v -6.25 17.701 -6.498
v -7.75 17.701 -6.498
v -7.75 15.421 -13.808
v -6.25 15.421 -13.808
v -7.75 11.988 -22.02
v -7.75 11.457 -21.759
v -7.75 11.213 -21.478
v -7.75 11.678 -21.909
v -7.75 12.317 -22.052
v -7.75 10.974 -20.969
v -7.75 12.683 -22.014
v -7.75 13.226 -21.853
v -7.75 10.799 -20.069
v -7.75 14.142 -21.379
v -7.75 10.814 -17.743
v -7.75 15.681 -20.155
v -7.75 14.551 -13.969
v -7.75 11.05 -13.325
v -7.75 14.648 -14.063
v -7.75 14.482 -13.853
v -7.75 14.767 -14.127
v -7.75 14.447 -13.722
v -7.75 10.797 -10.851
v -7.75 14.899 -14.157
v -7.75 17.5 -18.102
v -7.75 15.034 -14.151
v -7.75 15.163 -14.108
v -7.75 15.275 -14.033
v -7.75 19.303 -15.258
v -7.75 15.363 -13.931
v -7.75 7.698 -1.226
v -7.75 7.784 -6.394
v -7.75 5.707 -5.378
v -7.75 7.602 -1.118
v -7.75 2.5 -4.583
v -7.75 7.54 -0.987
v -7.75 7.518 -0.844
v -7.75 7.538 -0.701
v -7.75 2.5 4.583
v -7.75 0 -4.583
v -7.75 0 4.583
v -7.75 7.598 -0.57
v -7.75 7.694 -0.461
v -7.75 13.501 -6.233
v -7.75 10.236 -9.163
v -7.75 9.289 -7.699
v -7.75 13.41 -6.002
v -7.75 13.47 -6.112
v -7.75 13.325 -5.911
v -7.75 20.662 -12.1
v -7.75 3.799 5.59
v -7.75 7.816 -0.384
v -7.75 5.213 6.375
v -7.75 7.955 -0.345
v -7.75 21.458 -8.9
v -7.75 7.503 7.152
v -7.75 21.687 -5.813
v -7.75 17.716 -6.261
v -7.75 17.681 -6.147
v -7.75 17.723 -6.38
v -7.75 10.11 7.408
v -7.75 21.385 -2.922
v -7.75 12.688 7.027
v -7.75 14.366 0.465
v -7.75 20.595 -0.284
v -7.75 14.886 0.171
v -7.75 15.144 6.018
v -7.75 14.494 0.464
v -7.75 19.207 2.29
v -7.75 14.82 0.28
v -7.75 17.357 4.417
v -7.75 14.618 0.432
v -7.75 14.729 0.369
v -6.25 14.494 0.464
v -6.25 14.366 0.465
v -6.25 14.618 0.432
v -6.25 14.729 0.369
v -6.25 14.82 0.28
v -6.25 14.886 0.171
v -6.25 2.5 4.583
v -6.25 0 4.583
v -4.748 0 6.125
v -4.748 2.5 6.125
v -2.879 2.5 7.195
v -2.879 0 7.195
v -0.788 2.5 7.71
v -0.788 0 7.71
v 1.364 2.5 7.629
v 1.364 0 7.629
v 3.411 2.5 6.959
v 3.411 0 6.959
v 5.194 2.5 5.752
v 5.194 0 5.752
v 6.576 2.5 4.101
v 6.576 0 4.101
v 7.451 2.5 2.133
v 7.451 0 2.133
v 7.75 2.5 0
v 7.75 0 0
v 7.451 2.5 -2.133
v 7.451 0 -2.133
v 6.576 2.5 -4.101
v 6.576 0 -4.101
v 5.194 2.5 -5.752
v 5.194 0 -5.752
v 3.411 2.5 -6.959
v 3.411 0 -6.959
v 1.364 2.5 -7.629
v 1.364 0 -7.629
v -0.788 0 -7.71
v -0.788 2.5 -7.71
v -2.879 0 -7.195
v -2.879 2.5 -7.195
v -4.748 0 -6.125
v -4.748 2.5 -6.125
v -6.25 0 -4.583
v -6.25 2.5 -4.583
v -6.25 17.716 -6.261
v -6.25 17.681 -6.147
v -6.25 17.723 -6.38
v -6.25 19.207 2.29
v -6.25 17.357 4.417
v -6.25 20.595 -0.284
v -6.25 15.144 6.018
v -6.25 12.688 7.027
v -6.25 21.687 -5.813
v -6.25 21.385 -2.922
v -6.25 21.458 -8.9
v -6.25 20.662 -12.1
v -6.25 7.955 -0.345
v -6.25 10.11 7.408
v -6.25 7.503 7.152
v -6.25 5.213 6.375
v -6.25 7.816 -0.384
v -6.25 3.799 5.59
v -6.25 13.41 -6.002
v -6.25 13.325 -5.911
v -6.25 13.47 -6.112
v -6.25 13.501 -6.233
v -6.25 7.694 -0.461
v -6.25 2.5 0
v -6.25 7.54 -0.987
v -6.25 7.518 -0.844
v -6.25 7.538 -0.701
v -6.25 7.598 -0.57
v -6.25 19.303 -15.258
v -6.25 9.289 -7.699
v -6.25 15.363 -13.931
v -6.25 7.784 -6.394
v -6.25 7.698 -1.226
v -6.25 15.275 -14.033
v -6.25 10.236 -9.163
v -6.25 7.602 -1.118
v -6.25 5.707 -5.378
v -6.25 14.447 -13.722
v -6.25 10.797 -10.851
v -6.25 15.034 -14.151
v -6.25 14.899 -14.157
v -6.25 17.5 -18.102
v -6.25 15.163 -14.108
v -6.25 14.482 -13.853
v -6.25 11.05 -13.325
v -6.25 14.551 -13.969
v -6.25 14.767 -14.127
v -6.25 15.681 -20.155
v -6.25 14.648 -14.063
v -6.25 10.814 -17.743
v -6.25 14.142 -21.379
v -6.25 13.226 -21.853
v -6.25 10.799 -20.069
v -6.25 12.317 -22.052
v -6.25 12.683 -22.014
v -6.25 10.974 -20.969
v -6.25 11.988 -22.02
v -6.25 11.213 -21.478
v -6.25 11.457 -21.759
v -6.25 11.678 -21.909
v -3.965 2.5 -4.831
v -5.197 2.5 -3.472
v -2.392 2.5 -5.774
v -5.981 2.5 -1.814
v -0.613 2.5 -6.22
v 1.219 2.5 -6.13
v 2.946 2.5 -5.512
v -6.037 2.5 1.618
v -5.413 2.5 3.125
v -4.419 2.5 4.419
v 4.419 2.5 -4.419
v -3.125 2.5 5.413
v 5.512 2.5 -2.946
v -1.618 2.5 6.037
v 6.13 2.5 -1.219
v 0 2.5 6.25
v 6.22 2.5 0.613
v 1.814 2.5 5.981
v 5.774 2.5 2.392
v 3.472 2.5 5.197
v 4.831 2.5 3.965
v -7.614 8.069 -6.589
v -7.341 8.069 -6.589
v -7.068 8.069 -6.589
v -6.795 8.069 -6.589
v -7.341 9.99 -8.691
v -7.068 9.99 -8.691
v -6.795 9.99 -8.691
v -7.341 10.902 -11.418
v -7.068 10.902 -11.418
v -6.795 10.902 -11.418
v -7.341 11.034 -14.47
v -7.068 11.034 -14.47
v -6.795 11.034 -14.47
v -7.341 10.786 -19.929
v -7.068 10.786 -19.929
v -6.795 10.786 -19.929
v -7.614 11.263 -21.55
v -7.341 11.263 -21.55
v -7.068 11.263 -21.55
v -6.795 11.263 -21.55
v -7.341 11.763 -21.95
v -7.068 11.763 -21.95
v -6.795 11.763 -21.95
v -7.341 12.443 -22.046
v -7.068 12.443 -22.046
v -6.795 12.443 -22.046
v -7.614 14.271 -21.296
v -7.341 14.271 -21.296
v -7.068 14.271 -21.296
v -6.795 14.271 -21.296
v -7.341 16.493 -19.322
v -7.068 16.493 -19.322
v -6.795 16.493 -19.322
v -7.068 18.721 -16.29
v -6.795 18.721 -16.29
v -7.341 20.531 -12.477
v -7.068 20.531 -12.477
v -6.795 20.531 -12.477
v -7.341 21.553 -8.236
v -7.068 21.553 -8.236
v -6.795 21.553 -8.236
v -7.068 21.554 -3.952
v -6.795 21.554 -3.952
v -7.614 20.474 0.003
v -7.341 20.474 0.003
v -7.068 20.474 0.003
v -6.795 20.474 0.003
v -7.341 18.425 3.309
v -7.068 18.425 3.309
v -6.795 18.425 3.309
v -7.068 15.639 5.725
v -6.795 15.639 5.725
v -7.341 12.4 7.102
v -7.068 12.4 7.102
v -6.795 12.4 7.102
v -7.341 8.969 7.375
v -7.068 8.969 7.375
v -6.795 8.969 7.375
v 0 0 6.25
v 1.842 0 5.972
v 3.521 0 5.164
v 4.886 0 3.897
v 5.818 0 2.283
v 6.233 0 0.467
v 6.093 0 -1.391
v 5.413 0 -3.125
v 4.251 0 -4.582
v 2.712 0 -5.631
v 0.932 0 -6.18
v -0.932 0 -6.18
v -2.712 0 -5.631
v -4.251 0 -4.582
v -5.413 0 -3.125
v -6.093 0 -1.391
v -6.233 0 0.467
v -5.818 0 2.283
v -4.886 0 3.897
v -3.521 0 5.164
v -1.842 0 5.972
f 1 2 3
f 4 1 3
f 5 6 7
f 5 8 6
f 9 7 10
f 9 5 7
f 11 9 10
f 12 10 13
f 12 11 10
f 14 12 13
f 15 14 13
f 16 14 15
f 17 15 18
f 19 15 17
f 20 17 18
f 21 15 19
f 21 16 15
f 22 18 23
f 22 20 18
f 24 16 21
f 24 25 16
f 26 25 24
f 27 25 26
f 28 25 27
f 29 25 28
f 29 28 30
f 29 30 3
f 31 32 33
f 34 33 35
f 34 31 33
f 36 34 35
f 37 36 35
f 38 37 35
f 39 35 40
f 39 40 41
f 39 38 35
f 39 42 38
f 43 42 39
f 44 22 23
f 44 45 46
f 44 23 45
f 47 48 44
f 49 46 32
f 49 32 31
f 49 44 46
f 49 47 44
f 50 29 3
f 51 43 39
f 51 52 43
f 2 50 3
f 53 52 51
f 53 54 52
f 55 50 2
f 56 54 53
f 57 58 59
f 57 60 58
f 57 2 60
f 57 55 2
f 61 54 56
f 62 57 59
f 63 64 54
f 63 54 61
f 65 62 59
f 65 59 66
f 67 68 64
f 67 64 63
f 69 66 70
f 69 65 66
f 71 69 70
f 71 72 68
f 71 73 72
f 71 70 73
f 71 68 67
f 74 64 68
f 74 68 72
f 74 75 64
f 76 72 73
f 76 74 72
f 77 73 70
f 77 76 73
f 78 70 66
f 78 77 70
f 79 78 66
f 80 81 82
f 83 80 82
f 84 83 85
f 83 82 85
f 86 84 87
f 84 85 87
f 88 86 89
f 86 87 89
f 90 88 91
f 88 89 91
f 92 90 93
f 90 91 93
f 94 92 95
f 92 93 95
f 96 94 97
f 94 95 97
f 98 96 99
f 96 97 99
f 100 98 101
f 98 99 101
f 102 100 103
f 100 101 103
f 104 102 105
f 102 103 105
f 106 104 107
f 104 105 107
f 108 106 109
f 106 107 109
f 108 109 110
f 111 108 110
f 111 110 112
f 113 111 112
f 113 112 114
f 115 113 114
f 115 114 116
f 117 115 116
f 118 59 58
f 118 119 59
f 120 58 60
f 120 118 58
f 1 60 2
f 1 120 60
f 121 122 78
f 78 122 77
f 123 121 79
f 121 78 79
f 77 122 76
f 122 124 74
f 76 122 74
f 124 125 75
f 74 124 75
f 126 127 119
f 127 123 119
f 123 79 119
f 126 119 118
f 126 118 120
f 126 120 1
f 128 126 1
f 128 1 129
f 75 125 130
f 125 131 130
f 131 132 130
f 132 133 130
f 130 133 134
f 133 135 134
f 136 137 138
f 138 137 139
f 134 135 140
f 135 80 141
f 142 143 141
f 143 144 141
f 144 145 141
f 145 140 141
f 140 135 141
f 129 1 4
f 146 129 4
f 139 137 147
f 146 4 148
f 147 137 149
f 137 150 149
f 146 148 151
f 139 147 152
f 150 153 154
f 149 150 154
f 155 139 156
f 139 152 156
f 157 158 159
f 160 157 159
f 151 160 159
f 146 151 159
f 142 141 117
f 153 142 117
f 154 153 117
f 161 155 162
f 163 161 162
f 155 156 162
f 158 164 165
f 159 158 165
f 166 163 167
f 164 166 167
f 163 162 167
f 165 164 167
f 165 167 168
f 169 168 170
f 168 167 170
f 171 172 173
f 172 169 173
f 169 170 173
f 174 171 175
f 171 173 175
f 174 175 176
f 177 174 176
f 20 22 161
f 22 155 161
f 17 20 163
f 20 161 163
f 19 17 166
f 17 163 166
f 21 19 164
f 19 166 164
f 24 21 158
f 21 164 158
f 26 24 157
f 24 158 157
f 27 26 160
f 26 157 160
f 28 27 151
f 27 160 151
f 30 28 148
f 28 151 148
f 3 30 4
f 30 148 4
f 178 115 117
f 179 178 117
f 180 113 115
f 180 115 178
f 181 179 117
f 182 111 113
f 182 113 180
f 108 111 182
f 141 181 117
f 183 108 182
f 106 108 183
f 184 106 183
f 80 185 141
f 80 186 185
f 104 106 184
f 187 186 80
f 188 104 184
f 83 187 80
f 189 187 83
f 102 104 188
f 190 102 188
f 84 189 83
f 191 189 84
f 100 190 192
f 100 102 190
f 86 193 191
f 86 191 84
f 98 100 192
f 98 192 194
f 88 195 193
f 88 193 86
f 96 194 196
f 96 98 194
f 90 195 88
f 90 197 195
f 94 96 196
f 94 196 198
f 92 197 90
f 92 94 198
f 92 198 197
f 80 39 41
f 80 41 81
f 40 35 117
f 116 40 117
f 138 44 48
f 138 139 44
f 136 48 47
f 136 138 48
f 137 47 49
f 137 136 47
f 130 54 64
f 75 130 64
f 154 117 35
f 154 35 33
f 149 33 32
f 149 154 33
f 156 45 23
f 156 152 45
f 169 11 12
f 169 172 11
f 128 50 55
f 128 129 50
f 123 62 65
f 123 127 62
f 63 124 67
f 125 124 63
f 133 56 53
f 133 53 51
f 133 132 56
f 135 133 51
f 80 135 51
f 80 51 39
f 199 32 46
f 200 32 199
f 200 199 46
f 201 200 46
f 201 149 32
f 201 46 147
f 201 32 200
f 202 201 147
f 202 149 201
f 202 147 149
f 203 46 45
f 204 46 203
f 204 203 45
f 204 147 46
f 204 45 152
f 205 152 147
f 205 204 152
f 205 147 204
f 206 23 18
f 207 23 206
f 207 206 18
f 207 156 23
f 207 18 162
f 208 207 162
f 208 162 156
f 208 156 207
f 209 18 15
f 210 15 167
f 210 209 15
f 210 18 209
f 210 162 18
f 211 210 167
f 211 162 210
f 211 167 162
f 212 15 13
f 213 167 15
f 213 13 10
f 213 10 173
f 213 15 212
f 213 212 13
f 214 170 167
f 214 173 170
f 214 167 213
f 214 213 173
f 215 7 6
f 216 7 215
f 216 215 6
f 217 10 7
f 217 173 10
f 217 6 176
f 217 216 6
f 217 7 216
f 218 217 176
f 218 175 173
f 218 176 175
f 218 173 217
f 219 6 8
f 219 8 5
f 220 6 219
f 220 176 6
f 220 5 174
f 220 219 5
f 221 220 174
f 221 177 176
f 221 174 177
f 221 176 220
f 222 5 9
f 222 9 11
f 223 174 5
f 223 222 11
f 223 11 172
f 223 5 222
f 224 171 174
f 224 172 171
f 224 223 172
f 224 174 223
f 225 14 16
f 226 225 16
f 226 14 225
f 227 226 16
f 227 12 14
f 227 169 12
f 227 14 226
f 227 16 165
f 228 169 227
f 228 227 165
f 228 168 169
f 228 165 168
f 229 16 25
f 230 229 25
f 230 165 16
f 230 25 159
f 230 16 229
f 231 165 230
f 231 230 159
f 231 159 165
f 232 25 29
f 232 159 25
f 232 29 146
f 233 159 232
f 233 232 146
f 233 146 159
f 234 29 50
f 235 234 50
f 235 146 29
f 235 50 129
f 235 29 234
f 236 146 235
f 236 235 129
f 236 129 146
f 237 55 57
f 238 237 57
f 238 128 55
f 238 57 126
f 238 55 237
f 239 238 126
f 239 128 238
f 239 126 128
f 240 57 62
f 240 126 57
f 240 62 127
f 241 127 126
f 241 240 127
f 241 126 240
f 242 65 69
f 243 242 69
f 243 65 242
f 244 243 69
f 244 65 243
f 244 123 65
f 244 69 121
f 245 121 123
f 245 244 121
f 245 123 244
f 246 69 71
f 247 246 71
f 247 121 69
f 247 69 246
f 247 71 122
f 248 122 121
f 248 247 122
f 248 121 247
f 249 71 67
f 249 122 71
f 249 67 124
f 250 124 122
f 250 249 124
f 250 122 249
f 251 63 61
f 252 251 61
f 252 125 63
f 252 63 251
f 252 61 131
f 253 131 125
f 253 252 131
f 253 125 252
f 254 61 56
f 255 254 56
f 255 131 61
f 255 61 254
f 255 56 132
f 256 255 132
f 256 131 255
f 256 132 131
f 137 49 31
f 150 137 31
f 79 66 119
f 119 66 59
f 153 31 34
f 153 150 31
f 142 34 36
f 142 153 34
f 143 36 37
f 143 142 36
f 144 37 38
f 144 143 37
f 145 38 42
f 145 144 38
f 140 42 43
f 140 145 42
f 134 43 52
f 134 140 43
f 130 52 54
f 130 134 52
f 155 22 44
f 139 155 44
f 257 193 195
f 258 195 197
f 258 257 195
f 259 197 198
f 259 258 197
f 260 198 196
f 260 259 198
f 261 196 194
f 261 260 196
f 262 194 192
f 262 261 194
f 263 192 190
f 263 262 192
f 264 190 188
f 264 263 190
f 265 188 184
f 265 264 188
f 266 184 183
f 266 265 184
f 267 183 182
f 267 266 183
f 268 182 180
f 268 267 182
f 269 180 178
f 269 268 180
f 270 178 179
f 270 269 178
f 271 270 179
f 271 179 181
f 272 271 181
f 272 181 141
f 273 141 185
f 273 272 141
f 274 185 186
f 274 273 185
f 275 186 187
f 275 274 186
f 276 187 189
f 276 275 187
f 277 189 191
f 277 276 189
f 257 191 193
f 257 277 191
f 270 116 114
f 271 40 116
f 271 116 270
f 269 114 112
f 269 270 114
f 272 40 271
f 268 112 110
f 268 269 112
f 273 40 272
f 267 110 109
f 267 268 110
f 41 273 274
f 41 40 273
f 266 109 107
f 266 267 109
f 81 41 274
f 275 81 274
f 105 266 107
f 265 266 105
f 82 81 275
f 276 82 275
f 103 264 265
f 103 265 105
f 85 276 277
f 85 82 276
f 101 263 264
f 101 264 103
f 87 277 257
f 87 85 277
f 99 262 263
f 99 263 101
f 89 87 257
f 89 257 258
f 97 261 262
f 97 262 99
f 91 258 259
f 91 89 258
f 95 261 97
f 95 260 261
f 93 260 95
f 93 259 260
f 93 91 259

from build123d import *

# Parameters (mm, degrees)
SKETCH1_R           = 7.75
SKETCH1_R_2         = 6.25
BOSS_EXTRUDE1_DEPTH = 2.5
SKETCH2_W           = 1.5
SKETCH2_H           = 37
BOSS_EXTRUDE3_DEPTH = 20
SKETCH3_W           = 1.5
SKETCH3_H           = 9.16515139
BOSS_EXTRUDE4_DEPTH = 2.5
CUT_EXTRUDE1_START  = -1.5
CUT_EXTRUDE1_DEPTH  = 1.5
CUT_EXTRUDE2_DEPTH  = 1.5
FILLET1_R           = 0.5


# Read off the part's stored shape, not the designer's step: Cut-Extrude1
with BuildPart() as part:
    # Sketch1 → Boss-Extrude1 (new body)
    with BuildSketch(Plane(origin=(0, 0, 0), x_dir=(1, 0, 0), z_dir=(0, 1, 0))):
        with Locations(Location((0, 0, 0), (0, 0, 270))):
            Circle(SKETCH1_R)
        with Locations(Location((0, 0, 0), (0, 0, 270))):
            Circle(SKETCH1_R_2, mode=Mode.SUBTRACT)
    extrude(amount=BOSS_EXTRUDE1_DEPTH)

    # Sketch2 → Boss-Extrude3 (add)
    with BuildSketch(Plane(origin=(0, 2.5, 0), x_dir=(1, 0, 0), z_dir=(0, 1, 0))):
        with Locations((-7, 8.5)):
            Rectangle(SKETCH2_W, SKETCH2_H)
    extrude(amount=BOSS_EXTRUDE3_DEPTH)

    # Sketch3 → Boss-Extrude4 (add)
    with BuildSketch(Plane.XZ.offset(-2.5)):
        with Locations((-7, 0)):
            Rectangle(SKETCH3_W, SKETCH3_H)
    extrude(amount=BOSS_EXTRUDE4_DEPTH)

    # Cut-Extrude1 outline → Cut-Extrude1 (cut)
    with BuildSketch(Plane.ZY.offset(7.75).offset(CUT_EXTRUDE1_START)):
        with BuildLine():
            Line((-27, 2.5), (-4.582575695, 2.5))
            add(Edge.make_bspline(
                [(-4.582575695, 2.5), (-5.37555514, 7.388757929), (-8.076108426, 17.923102082), (-16.12020713, 15.261692376), (-31.450561972, -0.033072299), (-33.362744113, 1.044730307), (-22.700260878, 30.26334356), (-4.995418111, 34.118905882), (5.368168563, 20.755950952), (9.611214468, 17.48111109), (9.611214468, 7.985651231), (4.582575695, 2.5)],
                knots=[0, 0, 0, 0, 0, 0, 0, 0, 0, 0, 0, 0, 1, 1, 1, 1, 1, 1, 1, 1, 1, 1, 1, 1], degree=11))
            Line((4.582575695, 2.5), (10, 2.5))
            Line((10, 2.5), (10, 22.5))
            Line((10, 22.5), (-27, 22.5))
            Line((-27, 22.5), (-27, 2.5))
        make_face()
    extrude(amount=CUT_EXTRUDE1_DEPTH, mode=Mode.SUBTRACT)

    # Sketch5 → Cut-Extrude2 (cut)
    with BuildSketch(Plane.ZY.offset(7.75)):
        Polygon((-16.004011086, 14.735802895), (-6.037061634, 13.476408314), (-0.489539097, 6.814092623), (0.511425043, 14.735802895), (-6.318576051, 17.757074741), align=None)
    extrude(amount=-CUT_EXTRUDE2_DEPTH, mode=Mode.SUBTRACT)

    # Fillet1
    fillet1_edges = [part.edges().sort_by_distance(p)[0] for p in [
        (-7, 14.735802895, -16.004011086),
        (-7, 17.757074741, -6.318576051),
        (-7, 14.735802895, 0.511425043),
        (-7, 6.814092623, -0.489539097),
        (-7, 13.476408314, -6.037061634),
    ]]
    fillet(fillet1_edges, radius=FILLET1_R)


solid = part.part
